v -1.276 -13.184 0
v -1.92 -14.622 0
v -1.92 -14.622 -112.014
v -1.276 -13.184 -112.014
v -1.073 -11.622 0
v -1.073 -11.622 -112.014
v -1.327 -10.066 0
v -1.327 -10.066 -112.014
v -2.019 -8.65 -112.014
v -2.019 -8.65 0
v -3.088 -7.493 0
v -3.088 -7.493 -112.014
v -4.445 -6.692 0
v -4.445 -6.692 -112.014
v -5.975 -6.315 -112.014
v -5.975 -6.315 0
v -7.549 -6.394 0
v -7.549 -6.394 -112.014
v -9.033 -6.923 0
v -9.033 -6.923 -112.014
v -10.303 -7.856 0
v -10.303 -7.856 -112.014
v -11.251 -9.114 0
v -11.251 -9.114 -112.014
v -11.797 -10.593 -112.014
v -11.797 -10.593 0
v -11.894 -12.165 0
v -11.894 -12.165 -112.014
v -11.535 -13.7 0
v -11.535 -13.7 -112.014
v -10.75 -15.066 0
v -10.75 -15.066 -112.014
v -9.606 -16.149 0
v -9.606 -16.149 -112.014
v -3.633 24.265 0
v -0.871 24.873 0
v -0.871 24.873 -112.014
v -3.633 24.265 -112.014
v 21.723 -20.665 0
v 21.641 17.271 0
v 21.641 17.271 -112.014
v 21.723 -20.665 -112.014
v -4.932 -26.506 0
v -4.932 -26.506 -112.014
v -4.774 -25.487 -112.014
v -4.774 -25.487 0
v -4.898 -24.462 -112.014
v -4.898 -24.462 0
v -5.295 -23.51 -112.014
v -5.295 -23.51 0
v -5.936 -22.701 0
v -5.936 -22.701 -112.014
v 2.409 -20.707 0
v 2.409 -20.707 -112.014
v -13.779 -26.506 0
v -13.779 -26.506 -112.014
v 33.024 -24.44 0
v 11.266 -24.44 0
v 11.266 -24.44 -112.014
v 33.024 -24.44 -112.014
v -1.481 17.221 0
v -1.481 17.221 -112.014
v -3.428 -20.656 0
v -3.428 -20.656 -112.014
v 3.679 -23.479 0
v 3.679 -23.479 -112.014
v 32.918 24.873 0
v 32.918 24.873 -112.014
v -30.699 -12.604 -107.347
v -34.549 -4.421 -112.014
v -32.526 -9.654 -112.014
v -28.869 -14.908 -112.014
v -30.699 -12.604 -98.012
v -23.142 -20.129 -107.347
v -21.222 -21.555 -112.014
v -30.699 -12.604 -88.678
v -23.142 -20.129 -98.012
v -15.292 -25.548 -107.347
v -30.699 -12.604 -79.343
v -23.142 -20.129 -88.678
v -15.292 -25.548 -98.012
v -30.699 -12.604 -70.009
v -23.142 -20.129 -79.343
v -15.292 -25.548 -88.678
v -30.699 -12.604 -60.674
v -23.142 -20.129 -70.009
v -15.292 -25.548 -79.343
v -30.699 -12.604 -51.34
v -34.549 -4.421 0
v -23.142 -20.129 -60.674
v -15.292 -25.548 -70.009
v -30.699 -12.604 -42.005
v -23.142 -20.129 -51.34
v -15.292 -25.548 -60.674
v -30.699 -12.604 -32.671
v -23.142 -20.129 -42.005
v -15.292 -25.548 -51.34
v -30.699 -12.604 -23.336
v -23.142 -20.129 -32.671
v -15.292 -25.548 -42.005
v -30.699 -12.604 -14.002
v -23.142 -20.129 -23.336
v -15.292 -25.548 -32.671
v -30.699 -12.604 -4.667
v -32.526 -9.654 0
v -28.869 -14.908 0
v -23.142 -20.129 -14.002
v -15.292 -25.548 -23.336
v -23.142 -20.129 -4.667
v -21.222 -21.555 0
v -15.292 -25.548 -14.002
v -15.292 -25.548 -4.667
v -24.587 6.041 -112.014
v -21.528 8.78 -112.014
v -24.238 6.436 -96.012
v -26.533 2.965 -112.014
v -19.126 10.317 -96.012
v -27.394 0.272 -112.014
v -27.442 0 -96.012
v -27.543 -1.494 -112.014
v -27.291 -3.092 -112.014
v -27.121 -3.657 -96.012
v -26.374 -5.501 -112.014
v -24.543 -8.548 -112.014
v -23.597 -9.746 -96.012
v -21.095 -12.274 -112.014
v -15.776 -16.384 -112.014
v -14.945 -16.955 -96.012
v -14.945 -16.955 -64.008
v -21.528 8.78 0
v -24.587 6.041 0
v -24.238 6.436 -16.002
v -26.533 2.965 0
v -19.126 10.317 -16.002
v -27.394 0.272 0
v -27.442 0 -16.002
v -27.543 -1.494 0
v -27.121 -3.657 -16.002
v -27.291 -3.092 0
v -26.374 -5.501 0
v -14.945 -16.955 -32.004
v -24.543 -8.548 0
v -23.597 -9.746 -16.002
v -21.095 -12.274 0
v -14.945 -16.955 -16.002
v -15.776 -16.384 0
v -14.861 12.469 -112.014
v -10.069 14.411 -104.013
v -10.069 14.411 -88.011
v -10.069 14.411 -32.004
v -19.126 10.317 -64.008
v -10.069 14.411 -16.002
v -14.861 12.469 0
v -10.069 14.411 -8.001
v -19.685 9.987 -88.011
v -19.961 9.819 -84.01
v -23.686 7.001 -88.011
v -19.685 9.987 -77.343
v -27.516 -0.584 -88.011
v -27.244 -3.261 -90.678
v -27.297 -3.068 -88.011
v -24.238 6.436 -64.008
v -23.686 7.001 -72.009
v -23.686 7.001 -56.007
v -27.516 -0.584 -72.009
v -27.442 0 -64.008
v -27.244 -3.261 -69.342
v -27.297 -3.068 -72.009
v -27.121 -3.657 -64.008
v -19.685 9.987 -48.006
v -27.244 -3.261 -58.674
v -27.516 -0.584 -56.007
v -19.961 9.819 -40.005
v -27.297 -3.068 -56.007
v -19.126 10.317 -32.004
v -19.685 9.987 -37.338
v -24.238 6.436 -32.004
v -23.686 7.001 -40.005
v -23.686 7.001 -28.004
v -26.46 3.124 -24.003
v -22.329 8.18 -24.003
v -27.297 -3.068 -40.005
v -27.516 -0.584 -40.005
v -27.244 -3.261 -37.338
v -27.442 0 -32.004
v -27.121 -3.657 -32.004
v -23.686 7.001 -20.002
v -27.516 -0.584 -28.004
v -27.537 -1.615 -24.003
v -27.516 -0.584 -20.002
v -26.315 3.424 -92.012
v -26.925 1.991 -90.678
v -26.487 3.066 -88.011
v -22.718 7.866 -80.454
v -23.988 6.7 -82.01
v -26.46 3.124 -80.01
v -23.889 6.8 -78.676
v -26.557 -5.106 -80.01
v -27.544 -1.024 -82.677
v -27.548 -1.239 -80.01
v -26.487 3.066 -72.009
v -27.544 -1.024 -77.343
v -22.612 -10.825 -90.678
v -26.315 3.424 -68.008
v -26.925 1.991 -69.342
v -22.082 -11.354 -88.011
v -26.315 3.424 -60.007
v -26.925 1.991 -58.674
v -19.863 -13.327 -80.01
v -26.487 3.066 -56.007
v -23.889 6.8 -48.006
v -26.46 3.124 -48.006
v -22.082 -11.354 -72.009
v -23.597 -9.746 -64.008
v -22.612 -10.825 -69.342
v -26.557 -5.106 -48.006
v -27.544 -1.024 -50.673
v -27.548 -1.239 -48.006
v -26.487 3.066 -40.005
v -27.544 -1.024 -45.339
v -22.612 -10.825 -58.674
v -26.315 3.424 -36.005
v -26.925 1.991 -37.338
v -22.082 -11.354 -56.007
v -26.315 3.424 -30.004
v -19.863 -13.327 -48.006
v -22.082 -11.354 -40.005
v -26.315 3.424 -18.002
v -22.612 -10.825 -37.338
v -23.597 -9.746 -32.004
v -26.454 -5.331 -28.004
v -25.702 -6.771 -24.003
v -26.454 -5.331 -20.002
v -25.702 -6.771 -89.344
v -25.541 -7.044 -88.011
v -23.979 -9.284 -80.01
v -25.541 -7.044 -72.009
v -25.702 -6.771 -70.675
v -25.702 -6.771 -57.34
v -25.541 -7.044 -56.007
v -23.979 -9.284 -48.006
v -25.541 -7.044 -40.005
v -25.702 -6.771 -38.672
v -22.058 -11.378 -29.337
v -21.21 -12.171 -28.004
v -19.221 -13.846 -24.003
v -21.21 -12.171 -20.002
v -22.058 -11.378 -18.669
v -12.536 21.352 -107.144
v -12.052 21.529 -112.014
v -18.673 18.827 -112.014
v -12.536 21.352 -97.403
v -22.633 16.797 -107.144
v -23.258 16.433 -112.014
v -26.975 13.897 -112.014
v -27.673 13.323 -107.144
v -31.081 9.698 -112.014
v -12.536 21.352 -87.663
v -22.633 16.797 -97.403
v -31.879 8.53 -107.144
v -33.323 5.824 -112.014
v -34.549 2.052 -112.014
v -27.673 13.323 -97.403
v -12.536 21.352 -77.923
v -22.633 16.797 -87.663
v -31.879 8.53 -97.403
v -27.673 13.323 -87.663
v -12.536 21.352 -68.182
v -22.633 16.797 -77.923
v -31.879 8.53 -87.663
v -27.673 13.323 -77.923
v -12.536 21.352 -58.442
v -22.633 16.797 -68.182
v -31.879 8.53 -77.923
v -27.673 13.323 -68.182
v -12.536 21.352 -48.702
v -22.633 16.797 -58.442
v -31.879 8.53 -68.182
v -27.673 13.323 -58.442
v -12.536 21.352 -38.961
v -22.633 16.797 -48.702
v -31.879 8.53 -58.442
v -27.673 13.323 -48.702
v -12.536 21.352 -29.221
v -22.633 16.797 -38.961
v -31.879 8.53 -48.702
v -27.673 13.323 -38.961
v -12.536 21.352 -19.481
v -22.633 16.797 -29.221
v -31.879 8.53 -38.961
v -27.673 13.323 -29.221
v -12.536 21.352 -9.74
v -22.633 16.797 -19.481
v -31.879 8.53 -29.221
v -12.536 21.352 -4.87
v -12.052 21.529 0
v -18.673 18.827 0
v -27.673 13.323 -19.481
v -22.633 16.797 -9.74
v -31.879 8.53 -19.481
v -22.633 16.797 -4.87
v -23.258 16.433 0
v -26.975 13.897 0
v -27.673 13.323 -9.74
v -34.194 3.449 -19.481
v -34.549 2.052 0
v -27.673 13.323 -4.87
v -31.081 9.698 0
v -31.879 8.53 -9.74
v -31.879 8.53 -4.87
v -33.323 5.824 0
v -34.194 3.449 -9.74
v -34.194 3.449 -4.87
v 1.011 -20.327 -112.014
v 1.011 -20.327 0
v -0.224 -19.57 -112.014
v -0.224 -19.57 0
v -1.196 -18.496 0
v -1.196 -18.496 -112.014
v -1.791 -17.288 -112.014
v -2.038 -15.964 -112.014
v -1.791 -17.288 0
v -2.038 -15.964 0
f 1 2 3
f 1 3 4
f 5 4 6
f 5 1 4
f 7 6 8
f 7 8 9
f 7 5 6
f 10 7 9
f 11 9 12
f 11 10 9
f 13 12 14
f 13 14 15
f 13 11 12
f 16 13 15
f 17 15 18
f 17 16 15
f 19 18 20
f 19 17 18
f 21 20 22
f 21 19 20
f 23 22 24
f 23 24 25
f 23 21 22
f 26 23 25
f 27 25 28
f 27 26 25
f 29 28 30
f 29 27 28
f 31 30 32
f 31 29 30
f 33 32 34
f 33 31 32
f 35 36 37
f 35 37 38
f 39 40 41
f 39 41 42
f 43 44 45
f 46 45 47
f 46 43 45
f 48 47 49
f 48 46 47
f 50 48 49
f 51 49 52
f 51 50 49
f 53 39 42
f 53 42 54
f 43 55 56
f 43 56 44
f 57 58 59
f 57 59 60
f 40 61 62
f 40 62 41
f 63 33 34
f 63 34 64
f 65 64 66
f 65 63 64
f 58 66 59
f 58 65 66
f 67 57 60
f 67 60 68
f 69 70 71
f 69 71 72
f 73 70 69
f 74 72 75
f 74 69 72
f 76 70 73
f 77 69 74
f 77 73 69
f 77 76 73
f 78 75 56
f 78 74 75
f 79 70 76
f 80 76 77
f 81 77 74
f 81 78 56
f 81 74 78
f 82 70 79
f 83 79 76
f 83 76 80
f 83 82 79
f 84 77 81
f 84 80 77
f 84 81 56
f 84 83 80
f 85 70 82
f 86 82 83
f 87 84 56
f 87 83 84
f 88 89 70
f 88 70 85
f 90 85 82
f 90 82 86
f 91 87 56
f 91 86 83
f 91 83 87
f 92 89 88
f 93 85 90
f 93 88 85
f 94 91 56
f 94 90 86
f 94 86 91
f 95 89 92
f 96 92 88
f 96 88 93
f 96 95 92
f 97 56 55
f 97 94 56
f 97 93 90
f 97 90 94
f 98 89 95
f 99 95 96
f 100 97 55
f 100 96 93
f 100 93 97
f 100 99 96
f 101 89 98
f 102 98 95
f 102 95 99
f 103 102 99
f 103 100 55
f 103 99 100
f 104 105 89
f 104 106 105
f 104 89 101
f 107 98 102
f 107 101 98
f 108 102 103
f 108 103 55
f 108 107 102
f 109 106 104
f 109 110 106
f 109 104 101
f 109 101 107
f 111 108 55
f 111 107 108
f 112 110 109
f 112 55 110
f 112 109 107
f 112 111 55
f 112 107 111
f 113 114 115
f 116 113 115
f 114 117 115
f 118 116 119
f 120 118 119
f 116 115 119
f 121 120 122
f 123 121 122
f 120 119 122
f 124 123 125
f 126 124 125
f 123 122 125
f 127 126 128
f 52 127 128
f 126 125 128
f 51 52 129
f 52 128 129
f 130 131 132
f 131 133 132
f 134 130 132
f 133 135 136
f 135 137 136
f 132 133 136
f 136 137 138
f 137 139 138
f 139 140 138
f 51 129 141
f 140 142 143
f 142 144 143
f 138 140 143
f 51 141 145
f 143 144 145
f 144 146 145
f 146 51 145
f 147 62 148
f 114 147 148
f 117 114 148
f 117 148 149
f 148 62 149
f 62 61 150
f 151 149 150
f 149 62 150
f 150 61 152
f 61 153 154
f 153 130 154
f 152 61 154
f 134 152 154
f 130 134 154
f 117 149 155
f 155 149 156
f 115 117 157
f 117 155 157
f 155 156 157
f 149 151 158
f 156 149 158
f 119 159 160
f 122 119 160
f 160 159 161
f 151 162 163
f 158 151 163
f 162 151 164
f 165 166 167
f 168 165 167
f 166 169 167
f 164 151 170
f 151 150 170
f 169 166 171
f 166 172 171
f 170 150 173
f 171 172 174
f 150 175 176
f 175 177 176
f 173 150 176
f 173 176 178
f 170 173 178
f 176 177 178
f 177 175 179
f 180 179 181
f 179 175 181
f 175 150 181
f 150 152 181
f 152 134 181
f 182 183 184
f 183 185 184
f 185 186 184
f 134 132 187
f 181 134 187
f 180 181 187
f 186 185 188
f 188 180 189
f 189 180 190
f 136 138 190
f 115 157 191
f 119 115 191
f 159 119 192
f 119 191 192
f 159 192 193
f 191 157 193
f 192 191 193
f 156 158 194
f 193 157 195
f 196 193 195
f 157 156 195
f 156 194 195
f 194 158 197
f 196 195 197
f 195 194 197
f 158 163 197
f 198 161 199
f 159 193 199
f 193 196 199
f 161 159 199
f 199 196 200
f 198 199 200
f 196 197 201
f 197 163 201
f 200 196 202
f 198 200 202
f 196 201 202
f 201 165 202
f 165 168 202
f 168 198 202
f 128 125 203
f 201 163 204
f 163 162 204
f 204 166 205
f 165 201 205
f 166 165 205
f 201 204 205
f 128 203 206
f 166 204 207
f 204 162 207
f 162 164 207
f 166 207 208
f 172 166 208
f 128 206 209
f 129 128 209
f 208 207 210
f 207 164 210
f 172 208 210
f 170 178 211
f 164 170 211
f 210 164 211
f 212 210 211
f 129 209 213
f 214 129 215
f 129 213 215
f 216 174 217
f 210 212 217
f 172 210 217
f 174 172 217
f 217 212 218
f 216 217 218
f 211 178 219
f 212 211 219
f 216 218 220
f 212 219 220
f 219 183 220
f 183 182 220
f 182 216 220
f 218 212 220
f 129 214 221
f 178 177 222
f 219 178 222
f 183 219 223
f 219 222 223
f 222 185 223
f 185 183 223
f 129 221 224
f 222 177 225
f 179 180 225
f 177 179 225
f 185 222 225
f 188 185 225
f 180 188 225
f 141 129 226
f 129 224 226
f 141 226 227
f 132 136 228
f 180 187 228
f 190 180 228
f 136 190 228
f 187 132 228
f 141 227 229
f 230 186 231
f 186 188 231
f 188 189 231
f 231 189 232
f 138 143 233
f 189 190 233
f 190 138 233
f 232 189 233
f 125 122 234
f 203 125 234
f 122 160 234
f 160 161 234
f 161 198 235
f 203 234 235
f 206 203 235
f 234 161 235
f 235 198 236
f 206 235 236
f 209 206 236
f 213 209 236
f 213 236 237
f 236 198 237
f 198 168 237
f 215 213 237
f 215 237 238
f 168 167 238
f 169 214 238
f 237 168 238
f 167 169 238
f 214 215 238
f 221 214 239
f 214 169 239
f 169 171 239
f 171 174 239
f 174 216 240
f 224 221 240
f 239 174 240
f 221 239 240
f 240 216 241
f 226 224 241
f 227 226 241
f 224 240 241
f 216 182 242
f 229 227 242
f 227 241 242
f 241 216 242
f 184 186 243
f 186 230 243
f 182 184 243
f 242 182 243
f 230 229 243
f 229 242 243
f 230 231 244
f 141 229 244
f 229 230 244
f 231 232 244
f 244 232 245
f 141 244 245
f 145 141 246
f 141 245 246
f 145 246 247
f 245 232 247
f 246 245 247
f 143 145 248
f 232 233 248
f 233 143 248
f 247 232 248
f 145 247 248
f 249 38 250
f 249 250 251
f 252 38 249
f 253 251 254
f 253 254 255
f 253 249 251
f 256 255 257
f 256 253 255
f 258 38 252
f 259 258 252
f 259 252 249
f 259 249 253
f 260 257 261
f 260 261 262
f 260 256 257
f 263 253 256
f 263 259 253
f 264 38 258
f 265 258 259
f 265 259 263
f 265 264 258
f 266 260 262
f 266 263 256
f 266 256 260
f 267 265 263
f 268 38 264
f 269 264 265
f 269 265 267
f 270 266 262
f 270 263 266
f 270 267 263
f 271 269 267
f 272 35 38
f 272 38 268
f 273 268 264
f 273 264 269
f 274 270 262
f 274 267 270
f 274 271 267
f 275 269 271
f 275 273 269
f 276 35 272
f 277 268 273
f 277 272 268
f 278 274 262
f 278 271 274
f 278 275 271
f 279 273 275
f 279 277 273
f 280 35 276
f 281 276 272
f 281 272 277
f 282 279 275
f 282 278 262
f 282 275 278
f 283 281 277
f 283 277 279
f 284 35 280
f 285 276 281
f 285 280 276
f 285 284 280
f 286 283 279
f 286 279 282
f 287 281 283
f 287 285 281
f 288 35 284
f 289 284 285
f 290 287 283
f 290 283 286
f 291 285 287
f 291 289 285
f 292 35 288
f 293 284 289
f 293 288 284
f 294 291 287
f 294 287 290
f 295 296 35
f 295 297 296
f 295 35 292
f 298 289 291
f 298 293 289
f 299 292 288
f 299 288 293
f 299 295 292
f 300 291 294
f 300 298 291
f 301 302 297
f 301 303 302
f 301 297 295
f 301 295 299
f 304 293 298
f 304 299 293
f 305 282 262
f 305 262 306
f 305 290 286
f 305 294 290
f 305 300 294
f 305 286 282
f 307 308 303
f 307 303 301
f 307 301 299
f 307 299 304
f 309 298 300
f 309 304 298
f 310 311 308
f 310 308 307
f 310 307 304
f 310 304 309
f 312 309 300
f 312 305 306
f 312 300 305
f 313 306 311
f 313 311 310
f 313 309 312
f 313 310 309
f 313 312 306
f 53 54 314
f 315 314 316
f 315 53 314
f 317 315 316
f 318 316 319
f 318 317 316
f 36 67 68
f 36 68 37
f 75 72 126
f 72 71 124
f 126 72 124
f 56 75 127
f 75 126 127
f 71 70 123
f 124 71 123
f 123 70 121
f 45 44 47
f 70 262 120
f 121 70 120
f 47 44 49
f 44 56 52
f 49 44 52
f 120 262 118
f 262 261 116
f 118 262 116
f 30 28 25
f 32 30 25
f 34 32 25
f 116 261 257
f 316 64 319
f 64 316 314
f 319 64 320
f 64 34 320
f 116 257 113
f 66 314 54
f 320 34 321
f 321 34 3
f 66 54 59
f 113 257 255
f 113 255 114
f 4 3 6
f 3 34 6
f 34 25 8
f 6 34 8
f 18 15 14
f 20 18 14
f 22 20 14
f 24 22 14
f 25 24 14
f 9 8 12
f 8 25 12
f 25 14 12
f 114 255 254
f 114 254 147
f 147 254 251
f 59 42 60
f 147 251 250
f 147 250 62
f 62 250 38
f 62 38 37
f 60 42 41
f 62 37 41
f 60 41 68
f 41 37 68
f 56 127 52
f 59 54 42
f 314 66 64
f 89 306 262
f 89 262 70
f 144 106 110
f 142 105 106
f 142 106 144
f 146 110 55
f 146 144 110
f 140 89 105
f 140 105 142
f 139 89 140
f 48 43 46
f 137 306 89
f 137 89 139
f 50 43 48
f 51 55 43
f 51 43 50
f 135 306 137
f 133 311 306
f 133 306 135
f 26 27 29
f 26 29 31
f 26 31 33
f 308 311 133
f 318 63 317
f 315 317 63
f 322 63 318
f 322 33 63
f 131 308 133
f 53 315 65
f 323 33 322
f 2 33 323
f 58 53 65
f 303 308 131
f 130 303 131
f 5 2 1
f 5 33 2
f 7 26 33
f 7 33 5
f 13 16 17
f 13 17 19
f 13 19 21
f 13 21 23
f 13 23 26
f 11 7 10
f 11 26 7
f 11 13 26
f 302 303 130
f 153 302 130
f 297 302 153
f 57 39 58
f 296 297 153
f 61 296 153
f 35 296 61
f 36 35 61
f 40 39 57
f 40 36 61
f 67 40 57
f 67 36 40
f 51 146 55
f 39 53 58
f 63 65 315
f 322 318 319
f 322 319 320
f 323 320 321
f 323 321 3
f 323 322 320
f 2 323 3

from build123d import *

# Parameters (mm, degrees)
F1_DEPTH = 112.014


# Not quite as in the source:
# - the dataset's text gives a spline's control points without its knots; the knots are read off the source's solid


with BuildPart() as f1:
    # F0 (on Top) → F1 (new body)
    with BuildSketch(Plane.XY):
        with BuildLine():
            add(Edge.make_bspline(
                [(-3.6331126697, 24.2653177011), (-5.0309529603, 23.8382389404), (-7.8975267056, 22.9629912291), (-11.718090926, 21.6763315248), (-14.5334664534, 20.6006395255), (-16.182496931, 19.9268284227), (-17.8704875446, 19.2041676976), (-20.0294844318, 18.2054412077), (-22.2037087742, 17.0613993179), (-23.9249386903, 16.039932435), (-25.2004920279, 15.2133999646), (-26.4542240511, 14.3172946942), (-27.4750075017, 13.5025428385), (-28.2728766175, 12.8021712395), (-28.8604532589, 12.2502355378), (-29.4356650634, 11.6692589018), (-30.1827509214, 10.8516299584), (-31.0239328159, 9.8088760785), (-31.9008477948, 8.5318465415), (-32.6494845802, 7.2464120404), (-33.2785601353, 5.9641415612), (-33.7960973203, 4.6948725196), (-34.2100695572, 3.4449745693), (-34.4363698162, 2.5702966484), (-34.5371913675, 2.1084842073), (-34.5492400229, 2.0520120912)],
                knots=[0, 0, 0, 0, 0.0625, 0.125, 0.15625, 0.171875, 0.1875, 0.21875, 0.25, 0.265625, 0.28125, 0.296875, 0.3125, 0.3203125, 0.328125, 0.3359375, 0.34375, 0.359375, 0.375, 0.390625, 0.40625, 0.421875, 0.4375, 0.453125, 0.4553050227, 0.4553050227, 0.4553050227, 0.4553050227], degree=3))
            Line((-34.5492400229, 2.0520120912), (-34.5492400229, -4.4208203143))
            add(Edge.make_bspline(
                [(-34.5492400229, -4.4208203143), (-34.489113708, -4.6837345013), (-34.3746747946, -5.1291131913), (-34.1945112231, -5.731759966), (-33.9668488949, -6.420929735), (-33.642322086, -7.288220263), (-33.1904909143, -8.3348803349), (-32.6737742662, -9.3918843822), (-32.0900994525, -10.4577631597), (-31.43685187, -11.53009527), (-30.7114207375, -12.60472958), (-30.0440150101, -13.4982936399), (-29.4716351251, -14.2082014467), (-28.8705883228, -14.9162187281), (-28.0970743584, -15.7613933068), (-27.1403248028, -16.7214580423), (-26.1610852679, -17.6338632647), (-24.8327091865, -18.7942102065), (-23.1425198927, -20.1505242113), (-21.4473806936, -21.4011499112), (-20.1095106505, -22.3449978474), (-19.1227149693, -23.0242265175), (-18.1519831057, -23.6798380791), (-16.8678427909, -24.5320372769), (-15.4062427324, -25.4786943537), (-14.2798180934, -26.1918329815), (-13.7791677315, -26.5064007463)],
                knots=[0.5363355239, 0.5363355239, 0.5363355239, 0.5363355239, 0.546875, 0.5546875, 0.5625, 0.578125, 0.59375, 0.609375, 0.625, 0.640625, 0.65625, 0.671875, 0.6796875, 0.6875, 0.703125, 0.71875, 0.734375, 0.75, 0.78125, 0.8125, 0.828125, 0.84375, 0.859375, 0.875, 0.90625, 0.931578944, 0.931578944, 0.931578944, 0.931578944], degree=3))
            Line((-13.7791677315, -26.5064007463), (-4.9322219839, -26.5064007463))
            ThreePointArc((-4.9322219839, -26.5064007463), (-4.8975988419, -24.462141672), (-5.9359231964, -22.7008704096))
            add(Edge.make_bspline(
                [(-1.4808116248, 17.2207783908), (-5.1765813608, 16.0916188086), (-12.758111735, 13.7752521836), (-24.9027070765, 7.6414710987), (-27.8190436978, 0.1217712147), (-27.3803734584, -3.8196436866), (-23.9090668472, -10.4750472767), (-14.9292775561, -17.1682110986), (-8.9073592794, -20.8728602085), (-5.9359231964, -22.7008704096)],
                knots=[0, 0, 0, 0, 0.1652446349, 0.3389841111, 0.4667292372, 0.558017353, 0.684380504, 0.844261726, 1, 1, 1, 1], degree=3))
            Line((-1.4808116248, 17.2207783908), (21.6409831651, 17.2708898329))
            Line((21.6409831651, 17.2708898329), (21.723201308, -20.6651771691))
            Line((21.723201308, -20.6651771691), (2.4085581355, -20.7070374413))
            ThreePointArc((2.4085581355, -20.7070374413), (0.366288536, -19.9926081592), (-1.1964672012, -18.4962563217))
            ThreePointArc((-1.1964672012, -18.4962563217), (-1.9597863377, -16.6342281191), (-1.9197666552, -14.6222133189))
            ThreePointArc((-1.9197666552, -14.6222133189), (-7.5485703286, -6.3942683653), (-9.6057578921, -16.1487795413))
            ThreePointArc((-9.6057578921, -16.1487795413), (0.0367461623, -22.2913896471), (11.2658366561, -24.4401264936))
            Line((11.2658366561, -24.4401264936), (33.024482429, -24.4401264936))
            Line((33.024482429, -24.4401264936), (32.9176075757, 24.8727314174))
            Line((32.9176075757, 24.8727314174), (-0.8711330011, 24.8727314174))
            Line((-0.8711330011, 24.8727314174), (-3.6331126697, 24.2653177011))
        make_face()
    extrude(amount=-F1_DEPTH)


solid = f1.part
